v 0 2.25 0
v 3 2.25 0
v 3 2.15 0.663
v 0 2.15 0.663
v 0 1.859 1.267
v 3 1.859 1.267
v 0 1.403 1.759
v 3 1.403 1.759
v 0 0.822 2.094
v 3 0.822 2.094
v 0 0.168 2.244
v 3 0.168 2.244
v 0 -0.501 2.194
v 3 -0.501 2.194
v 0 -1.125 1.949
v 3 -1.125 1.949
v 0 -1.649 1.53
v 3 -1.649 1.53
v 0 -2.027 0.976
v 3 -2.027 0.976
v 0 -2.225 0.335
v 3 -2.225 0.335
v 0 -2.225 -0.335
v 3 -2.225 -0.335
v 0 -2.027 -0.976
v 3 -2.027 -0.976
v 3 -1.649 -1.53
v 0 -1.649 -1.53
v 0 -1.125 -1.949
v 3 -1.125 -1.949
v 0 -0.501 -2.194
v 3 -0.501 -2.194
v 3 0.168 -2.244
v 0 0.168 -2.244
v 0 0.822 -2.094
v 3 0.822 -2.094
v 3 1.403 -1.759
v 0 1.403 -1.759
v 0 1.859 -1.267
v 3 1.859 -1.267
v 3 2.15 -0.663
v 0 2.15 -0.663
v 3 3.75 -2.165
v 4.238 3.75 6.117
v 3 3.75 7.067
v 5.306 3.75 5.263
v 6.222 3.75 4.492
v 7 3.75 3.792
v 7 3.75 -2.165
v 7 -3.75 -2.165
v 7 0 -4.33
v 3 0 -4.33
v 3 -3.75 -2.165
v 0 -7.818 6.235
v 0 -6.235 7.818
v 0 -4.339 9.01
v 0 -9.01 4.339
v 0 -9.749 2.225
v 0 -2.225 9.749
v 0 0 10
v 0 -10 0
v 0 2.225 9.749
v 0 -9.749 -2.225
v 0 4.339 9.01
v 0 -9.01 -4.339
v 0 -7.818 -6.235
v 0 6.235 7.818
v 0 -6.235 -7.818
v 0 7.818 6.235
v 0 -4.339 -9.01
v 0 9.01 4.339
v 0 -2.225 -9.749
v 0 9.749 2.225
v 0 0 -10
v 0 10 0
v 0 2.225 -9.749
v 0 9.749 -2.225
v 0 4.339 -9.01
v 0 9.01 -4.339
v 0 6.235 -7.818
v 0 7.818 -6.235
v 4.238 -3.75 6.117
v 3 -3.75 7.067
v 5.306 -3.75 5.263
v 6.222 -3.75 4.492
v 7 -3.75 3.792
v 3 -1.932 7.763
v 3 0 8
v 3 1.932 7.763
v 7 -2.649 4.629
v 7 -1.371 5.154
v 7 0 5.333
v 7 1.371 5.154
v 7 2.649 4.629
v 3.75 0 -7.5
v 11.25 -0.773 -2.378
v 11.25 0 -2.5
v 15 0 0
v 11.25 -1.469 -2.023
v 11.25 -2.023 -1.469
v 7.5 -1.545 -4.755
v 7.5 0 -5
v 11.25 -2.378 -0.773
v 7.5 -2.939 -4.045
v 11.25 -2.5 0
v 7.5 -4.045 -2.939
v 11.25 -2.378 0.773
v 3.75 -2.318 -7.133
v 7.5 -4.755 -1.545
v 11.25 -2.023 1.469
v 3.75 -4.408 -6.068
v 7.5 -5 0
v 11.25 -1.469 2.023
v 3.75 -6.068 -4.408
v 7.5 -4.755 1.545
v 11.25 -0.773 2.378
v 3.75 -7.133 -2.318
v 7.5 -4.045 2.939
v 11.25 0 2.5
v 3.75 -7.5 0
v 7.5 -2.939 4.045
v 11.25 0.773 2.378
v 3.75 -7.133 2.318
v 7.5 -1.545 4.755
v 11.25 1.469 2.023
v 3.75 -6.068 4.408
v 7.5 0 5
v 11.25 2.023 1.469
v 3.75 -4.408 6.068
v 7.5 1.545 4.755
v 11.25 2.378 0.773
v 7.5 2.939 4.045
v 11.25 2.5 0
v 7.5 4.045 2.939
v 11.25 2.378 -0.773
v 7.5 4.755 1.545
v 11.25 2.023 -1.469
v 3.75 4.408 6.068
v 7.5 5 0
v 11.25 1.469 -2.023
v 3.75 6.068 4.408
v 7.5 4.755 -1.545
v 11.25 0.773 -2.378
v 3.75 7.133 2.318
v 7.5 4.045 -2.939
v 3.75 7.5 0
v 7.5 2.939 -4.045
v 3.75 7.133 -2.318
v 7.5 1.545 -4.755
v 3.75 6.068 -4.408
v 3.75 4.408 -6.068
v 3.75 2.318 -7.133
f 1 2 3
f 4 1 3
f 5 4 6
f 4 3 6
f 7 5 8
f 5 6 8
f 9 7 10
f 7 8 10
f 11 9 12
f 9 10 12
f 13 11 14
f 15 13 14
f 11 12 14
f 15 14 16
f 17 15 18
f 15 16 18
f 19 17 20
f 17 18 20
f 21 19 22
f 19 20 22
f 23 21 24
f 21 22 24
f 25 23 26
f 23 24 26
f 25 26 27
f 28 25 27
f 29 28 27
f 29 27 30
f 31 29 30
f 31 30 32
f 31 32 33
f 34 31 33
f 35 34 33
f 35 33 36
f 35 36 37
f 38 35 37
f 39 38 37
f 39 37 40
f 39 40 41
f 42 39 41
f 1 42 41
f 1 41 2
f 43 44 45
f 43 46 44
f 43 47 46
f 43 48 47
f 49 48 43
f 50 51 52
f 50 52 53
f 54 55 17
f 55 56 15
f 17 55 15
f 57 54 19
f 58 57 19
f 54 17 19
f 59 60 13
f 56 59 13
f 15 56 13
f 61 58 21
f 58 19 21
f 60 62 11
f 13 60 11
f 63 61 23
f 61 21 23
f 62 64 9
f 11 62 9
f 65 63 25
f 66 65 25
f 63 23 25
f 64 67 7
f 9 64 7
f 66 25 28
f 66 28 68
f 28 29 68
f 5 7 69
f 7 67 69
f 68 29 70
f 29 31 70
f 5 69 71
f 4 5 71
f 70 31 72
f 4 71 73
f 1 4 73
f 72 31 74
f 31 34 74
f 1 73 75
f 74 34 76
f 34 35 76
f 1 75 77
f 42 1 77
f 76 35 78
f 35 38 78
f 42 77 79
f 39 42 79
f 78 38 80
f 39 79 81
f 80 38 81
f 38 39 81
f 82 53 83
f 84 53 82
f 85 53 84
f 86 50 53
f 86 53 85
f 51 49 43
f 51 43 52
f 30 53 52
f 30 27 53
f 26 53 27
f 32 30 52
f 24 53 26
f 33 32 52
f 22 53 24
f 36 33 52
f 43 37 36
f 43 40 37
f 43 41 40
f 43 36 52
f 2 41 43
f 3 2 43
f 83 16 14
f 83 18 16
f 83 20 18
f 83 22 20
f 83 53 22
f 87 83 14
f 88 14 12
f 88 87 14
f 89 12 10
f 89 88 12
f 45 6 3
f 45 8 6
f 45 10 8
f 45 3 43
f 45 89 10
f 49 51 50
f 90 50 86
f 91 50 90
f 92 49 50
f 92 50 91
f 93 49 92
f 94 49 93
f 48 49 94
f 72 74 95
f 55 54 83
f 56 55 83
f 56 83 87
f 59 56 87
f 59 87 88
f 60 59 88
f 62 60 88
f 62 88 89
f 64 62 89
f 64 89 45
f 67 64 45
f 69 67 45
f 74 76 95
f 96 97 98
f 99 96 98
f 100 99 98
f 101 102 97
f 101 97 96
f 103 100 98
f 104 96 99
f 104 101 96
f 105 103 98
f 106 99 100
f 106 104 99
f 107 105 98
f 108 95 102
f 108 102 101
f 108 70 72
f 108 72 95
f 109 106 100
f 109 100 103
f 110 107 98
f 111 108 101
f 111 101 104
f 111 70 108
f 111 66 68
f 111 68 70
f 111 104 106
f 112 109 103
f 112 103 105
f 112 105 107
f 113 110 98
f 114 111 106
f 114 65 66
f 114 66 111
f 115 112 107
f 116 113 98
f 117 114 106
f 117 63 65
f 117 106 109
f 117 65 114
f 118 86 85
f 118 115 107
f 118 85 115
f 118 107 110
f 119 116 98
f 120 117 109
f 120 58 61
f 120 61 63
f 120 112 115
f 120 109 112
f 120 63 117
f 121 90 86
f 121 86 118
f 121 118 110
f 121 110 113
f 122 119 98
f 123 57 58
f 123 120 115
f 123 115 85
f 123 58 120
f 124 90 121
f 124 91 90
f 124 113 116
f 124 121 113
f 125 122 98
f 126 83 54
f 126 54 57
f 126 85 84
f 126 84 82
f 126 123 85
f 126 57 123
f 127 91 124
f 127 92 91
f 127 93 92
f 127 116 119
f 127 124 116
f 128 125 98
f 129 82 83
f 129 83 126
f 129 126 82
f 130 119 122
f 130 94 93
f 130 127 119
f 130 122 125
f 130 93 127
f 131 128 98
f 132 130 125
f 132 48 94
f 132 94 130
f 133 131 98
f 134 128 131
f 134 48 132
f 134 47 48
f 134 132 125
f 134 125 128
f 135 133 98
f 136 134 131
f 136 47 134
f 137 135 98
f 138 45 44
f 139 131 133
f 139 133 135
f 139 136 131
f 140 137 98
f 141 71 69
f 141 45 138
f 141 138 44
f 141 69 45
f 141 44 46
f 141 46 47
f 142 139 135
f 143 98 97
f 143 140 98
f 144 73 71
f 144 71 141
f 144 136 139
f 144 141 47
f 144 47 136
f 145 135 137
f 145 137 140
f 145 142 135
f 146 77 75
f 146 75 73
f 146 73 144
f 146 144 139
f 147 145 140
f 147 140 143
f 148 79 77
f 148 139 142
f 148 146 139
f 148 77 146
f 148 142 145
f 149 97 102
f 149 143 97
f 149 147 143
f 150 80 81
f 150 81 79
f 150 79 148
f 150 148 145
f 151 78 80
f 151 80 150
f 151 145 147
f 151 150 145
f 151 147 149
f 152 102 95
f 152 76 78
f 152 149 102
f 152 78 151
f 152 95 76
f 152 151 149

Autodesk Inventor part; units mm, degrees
ref_plane "XZ Plane" through (0, 0, 0) normal (0, 1, 0) x (-1, 0, 0)
ref_plane "XY Plane" through (0, 0, 0) normal (0, 0, 1) x (1, 0, 0)
ref_plane "Work Plane1" through (7, 0, 0) normal (1, 0, 0) x (0, 1, 0)
sketch "Sketch1" plane through (0, 0, 0) normal (0, 1, 0) x (-1, 0, 0)
  line L0 (0, 0) -> (-15, 0)
  line L1 (0, 0) -> (0, -10)
  line L2 (-15, 0) -> (-15, 0)
  line L3 (-15, 0) -> (0, -10)
  dimension "d0" = 15
  dimension "d1" = 10
  dimension "d2" = 0
revolve "Revolution1" add sketch "Sketch1" angle 360 about axis through (0, 0, 0) along (1, 0, 0)
sketch "Sketch2" plane through (7, 0, 0) normal (1, 0, 0) x (0, 1, 0)
  circle A0 centre (0, 0) radius 2.25
  dimension "d5" = 4.5
extrude "Extrusion1" cut sketch "Sketch2" along normal blind 2 and the other way blind 10
sketch "Sketch3" plane through (7, 0, 0) normal (1, 0, 0) x (0, 1, 0)
  line L0 (0, 0) -> (3.75, 0)
  line L1 (3.75, -2.1651) -> (0, -4.3301)
  line L2 (0, -4.3301) -> (-3.75, -2.1651)
  line L3 (-3.75, -2.1651) -> (-3.75, 2.1651)
  line L4 (-3.75, 2.1651) -> (0, 4.3301)
  line L5 (0, 4.3301) -> (3.75, 2.1651)
  line L6 (3.75, 2.1651) -> (3.75, -2.1651)
  line L7 (-3.75, 14.6203) -> (-3.75, 2.1651)
  line L8 (-3.75, 14.6203) -> (3.75, 14.6203)
  line L9 (3.75, 14.6203) -> (3.75, 1.2022)
  line L10 (3.75, 1.2022) -> (-3.75, 1.2022)
  line L11 (-3.75, 1.2022) -> (-3.75, 14.6203)
  dimension "d15" = 3.75
extrude "Extrusion2" cut sketch "Sketch3" against normal blind 4
sketch "Sketch5" plane through (9, 0, 0) normal (-1, 0, 0) x (0, 0, 1)
  circle A0 centre (0, 0) radius 2.25 projected
extrude "Extrusion3" add sketch "Sketch5" along normal up to surface (2 mm away)
properties part number "stollen_m4_spitz"
